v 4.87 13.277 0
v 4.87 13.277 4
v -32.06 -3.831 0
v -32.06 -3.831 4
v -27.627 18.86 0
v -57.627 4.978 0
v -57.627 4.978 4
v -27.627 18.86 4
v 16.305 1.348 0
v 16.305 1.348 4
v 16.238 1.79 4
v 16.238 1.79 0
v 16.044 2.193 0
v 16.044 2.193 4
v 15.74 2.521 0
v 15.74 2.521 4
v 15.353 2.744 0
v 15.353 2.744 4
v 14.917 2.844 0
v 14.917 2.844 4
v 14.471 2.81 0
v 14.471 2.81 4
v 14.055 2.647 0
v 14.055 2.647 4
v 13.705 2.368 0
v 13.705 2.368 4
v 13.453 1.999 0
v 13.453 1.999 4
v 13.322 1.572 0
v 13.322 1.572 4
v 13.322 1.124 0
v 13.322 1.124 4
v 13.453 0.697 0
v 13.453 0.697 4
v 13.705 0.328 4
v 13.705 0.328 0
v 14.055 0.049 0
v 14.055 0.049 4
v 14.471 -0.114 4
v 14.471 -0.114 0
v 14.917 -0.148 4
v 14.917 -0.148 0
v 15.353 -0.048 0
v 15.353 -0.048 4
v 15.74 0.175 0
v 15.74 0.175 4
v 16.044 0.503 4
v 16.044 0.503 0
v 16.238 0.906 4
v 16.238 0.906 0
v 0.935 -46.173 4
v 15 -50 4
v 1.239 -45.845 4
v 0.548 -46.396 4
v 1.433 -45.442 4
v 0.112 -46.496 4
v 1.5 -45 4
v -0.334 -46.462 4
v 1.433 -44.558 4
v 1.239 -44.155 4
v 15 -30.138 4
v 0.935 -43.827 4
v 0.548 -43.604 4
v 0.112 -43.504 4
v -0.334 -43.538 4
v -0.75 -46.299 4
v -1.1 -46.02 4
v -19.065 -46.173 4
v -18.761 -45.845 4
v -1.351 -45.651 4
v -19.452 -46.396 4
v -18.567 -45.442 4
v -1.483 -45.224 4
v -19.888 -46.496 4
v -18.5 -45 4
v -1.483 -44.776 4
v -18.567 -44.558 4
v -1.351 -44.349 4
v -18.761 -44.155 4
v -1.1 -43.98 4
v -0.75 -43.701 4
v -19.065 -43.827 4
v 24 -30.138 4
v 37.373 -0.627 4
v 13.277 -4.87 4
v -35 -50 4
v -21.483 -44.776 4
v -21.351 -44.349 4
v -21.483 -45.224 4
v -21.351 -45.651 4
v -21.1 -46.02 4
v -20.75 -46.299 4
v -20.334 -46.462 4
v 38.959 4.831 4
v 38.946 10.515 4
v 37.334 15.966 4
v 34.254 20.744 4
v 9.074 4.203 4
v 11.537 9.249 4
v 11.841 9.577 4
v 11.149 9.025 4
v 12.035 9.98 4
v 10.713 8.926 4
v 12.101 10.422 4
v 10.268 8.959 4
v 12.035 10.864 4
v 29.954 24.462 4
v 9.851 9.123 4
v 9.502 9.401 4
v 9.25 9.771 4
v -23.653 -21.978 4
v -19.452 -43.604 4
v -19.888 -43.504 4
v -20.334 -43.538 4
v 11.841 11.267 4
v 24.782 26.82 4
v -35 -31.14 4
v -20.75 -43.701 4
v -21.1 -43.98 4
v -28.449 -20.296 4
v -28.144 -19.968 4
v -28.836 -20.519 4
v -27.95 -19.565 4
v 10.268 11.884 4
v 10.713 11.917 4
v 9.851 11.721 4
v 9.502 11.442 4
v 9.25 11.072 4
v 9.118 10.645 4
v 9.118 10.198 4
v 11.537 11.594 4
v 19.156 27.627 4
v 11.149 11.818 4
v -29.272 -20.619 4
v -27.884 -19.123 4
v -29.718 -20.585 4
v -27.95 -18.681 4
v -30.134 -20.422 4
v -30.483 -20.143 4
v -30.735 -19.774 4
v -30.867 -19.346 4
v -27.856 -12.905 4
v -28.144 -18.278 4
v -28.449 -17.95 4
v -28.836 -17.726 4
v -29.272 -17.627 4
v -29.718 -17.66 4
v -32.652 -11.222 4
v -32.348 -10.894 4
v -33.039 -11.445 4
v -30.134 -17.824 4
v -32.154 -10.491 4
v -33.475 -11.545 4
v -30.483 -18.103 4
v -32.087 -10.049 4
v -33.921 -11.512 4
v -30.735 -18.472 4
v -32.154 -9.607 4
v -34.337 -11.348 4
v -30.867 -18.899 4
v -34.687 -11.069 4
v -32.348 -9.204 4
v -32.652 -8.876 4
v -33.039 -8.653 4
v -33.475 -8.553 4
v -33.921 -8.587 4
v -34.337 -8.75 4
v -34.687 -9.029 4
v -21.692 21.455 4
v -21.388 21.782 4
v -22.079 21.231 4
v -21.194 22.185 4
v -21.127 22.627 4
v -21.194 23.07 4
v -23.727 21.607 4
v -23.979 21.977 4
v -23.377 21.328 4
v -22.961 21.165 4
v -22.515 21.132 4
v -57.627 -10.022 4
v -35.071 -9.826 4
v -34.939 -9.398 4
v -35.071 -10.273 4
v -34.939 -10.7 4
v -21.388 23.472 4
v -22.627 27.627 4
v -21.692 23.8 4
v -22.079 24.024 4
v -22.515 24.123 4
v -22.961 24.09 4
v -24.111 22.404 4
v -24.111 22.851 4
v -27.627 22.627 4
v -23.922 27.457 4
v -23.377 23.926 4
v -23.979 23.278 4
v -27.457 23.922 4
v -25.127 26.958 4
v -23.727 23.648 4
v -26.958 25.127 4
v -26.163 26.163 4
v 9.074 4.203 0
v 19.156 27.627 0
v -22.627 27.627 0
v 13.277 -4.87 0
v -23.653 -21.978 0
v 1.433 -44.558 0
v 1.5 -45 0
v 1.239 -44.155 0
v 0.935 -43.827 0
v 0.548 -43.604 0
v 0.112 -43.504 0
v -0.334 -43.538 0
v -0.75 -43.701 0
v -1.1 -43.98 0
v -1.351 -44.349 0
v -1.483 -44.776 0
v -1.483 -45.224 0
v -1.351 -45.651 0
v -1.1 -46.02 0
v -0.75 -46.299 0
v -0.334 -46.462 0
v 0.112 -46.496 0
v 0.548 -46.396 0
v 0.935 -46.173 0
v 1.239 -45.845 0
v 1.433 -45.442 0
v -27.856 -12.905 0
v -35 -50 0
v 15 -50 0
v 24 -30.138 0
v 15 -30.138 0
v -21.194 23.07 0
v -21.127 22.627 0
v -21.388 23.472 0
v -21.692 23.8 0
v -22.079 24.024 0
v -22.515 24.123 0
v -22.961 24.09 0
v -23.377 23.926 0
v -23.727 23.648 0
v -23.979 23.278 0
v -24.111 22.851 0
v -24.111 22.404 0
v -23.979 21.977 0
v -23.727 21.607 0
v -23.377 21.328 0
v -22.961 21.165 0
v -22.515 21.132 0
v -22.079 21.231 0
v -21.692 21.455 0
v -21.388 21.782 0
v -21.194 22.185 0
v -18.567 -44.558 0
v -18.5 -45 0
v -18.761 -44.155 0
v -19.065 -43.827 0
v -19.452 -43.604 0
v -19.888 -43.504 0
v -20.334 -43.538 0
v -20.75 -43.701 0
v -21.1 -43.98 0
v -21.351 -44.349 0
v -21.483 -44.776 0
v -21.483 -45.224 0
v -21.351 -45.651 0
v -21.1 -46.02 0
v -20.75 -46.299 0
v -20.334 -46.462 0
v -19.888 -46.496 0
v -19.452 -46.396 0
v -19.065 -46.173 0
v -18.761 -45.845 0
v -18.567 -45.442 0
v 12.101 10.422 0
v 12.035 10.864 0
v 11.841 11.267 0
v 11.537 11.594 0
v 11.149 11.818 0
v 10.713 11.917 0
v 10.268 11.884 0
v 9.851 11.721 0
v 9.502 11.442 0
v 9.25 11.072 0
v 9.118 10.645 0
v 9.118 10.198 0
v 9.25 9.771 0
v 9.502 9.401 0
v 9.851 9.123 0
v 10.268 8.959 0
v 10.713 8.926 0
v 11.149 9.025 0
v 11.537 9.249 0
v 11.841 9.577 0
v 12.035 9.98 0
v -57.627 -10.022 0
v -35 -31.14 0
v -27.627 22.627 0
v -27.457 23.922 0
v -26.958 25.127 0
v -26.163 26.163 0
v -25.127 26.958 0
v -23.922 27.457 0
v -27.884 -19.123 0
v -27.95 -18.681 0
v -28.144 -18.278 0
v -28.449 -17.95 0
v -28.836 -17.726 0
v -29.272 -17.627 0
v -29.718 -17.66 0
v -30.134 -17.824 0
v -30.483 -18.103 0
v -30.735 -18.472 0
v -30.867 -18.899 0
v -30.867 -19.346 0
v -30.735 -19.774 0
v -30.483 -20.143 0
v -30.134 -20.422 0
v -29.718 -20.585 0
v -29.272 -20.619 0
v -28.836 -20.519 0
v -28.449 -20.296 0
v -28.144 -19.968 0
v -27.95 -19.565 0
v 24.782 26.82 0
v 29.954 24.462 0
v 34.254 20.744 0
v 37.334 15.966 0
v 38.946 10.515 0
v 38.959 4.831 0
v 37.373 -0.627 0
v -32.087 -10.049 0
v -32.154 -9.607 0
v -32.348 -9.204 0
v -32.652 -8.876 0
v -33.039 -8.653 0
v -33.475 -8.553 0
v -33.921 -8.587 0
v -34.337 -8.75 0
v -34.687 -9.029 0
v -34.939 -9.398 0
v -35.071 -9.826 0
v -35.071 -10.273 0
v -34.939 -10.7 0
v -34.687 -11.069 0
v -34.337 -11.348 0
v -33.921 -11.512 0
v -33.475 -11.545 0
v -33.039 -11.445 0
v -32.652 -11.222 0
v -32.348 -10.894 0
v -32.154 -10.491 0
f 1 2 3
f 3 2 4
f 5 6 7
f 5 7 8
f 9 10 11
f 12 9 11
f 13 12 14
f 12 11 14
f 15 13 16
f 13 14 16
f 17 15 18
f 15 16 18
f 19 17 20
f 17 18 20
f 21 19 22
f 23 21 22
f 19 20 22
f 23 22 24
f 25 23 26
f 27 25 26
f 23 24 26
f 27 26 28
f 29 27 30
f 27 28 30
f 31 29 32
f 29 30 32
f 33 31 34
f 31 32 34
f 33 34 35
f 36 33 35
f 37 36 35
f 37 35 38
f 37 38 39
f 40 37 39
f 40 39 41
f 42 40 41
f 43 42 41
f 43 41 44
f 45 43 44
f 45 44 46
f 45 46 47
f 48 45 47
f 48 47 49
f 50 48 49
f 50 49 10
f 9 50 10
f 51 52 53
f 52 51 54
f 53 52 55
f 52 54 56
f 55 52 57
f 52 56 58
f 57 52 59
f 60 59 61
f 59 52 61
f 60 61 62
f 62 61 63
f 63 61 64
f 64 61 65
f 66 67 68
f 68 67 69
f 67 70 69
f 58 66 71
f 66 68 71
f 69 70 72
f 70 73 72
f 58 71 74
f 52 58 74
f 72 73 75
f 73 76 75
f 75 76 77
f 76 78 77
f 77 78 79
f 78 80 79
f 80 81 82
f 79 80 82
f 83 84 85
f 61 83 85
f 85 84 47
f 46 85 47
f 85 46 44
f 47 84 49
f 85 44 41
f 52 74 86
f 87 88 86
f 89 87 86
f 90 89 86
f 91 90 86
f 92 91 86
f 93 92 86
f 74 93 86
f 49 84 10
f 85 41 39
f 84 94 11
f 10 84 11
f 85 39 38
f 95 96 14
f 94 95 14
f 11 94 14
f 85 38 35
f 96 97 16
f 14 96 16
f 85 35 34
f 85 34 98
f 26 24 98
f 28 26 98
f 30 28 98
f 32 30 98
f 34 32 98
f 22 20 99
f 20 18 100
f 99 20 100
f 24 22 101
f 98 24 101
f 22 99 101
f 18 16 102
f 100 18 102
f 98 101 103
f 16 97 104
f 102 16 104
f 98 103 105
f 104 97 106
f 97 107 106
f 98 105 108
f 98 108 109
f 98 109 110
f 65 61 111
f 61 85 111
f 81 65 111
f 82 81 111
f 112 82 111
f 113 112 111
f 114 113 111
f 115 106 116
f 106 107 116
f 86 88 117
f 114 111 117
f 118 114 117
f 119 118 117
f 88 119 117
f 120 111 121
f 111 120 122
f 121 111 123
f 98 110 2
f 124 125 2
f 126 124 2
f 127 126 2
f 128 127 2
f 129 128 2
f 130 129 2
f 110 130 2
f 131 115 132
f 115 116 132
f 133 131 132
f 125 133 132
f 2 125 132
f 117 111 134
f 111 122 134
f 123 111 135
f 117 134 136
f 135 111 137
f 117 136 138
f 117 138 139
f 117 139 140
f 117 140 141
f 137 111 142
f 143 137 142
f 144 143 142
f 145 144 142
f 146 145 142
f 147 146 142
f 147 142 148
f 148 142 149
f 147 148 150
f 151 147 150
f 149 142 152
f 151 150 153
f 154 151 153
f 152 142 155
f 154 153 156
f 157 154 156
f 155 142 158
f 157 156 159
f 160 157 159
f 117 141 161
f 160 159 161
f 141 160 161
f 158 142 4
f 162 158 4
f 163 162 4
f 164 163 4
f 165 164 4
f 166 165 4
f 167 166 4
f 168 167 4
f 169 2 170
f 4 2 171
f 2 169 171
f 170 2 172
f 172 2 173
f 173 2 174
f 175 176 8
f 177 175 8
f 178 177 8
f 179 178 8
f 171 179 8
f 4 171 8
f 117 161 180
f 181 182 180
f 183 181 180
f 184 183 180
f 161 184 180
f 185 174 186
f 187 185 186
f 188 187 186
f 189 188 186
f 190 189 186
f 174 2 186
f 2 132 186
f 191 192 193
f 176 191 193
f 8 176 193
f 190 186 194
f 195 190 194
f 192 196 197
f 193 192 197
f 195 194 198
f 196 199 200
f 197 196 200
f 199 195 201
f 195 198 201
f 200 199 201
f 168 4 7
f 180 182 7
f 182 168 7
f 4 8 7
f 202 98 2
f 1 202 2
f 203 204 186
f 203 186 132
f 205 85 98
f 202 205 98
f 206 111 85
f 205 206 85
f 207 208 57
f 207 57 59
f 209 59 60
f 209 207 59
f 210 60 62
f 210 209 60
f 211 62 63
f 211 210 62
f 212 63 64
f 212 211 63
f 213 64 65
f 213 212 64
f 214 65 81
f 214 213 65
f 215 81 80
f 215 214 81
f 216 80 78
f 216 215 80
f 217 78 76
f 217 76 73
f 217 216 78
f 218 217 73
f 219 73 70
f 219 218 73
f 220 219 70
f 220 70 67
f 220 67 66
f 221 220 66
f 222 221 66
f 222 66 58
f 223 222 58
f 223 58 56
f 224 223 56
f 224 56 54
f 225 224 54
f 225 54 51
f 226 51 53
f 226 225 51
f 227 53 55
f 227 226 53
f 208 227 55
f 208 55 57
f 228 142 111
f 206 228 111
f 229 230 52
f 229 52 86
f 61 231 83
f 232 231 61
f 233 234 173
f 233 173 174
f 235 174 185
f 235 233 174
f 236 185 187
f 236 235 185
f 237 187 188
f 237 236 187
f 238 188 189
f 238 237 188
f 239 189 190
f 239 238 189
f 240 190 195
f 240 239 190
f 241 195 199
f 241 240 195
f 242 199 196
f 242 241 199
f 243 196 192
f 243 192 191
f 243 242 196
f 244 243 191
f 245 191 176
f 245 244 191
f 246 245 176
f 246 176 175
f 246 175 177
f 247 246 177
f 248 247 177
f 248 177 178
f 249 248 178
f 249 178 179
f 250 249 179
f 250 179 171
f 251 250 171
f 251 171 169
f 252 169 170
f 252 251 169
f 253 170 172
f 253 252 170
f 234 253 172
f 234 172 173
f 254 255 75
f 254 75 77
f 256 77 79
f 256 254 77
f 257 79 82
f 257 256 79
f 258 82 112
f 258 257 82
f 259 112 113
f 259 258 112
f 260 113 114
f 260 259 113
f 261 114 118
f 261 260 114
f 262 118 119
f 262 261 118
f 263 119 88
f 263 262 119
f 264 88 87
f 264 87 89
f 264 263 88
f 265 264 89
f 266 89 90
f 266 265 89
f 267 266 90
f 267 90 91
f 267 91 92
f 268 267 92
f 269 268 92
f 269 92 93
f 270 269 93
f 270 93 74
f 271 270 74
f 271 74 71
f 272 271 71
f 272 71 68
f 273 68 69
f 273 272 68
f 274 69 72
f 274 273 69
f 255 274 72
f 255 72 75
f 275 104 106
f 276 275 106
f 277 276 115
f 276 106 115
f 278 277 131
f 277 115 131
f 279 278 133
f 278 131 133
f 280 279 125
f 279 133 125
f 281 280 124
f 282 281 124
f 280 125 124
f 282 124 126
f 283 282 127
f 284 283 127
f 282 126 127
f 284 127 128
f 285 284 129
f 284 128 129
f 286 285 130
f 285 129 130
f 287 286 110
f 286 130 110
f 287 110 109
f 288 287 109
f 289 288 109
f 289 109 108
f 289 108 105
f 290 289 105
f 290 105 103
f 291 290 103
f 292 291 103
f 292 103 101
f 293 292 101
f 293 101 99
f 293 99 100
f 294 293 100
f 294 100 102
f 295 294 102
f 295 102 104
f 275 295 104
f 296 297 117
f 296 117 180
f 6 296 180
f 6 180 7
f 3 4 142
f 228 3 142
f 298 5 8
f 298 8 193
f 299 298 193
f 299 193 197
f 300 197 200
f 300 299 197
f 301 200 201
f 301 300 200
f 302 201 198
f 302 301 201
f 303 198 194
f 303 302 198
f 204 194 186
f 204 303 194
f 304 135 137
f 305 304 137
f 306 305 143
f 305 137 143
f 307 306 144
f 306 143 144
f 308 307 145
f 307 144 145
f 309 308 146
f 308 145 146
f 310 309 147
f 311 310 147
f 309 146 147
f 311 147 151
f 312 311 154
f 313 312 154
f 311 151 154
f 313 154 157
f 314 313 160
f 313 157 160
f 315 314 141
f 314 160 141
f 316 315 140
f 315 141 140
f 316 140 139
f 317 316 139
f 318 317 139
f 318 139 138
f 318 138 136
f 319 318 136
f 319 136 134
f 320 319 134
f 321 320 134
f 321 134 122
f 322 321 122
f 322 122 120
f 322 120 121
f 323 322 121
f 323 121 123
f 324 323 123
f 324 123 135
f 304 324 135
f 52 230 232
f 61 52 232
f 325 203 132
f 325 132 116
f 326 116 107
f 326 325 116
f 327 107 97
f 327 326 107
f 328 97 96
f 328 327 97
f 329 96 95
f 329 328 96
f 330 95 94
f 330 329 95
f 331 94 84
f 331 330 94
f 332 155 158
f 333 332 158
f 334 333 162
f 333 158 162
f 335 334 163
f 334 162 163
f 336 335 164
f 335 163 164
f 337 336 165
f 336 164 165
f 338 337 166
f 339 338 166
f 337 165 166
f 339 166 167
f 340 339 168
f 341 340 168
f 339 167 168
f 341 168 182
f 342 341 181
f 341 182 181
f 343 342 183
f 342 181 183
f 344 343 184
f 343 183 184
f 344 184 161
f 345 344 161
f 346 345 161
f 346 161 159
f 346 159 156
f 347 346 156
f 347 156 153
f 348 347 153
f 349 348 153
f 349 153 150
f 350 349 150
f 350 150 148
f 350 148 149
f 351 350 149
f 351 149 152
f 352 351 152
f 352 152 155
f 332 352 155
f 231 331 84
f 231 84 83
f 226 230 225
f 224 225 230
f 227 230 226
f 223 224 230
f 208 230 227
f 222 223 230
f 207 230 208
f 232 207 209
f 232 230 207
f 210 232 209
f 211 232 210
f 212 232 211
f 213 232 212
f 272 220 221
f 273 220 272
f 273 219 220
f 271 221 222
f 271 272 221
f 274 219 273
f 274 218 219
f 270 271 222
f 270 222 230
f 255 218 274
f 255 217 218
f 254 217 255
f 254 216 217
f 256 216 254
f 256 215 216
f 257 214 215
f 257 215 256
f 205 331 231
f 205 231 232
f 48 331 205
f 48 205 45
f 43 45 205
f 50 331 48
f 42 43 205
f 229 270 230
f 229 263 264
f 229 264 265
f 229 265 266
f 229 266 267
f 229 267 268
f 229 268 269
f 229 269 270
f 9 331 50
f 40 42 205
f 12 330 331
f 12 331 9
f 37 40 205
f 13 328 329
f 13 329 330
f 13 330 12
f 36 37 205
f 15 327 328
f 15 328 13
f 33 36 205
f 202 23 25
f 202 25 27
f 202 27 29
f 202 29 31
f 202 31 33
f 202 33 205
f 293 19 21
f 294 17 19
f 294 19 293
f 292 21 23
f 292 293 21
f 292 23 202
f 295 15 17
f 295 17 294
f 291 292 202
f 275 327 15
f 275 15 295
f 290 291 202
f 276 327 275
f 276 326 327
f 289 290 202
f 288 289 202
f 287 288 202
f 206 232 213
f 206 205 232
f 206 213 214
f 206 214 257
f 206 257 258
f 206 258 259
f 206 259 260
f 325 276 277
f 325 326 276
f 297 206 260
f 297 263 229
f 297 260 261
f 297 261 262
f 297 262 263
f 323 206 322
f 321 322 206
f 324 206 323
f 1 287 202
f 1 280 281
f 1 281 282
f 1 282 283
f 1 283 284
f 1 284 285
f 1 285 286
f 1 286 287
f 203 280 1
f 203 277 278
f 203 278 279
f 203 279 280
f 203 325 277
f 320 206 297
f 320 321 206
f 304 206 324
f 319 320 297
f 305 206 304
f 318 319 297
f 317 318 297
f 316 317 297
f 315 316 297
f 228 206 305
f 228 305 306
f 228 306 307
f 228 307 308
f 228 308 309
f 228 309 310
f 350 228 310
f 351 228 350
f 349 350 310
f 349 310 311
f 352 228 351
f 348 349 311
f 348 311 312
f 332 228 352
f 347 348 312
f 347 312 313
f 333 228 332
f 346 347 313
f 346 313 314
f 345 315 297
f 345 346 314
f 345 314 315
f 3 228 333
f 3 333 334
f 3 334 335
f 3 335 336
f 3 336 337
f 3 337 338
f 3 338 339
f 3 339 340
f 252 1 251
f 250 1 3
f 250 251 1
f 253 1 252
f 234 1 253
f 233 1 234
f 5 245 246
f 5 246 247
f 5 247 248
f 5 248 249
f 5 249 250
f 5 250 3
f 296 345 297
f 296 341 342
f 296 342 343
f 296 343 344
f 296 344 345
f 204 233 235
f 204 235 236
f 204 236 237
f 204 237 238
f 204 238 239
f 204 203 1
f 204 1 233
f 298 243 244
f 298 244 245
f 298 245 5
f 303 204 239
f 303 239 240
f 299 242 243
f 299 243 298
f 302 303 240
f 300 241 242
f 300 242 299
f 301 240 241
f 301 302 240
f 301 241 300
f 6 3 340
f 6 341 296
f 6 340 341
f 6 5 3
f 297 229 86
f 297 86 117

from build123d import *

# Parameters (mm, degrees)
SCHIZZO1_R                   = 2.5
SCHIZZO1_R_2                 = 1.5
ESTRUSIONE_ESTRUSIONE1_DEPTH = 4
TAGLIO_ESTRUSIONE1_DEPTH     = 77.399732917
SCHIZZO3_R                   = 1.5
TAGLIO_ESTRUSIONE2_DEPTH     = 77.399732917
CROQUIS1_W                   = 9
CROQUIS1_H                   = 19.861523984
CORTAR_EXTRUIR1_DEPTH        = 10


with BuildPart() as part:
    # Schizzo1 → Estrusione-Estrusione1 (new body)
    with BuildSketch(Plane.XY):
        with BuildLine():
            Line((15, -50), (-35, -50))
            Line((-35, -50), (-35, -31.140095692))
            Line((-35, -31.140095692), (-57.627416998, -10.021990785))
            Line((-57.627416998, -10.021990785), (-57.627416998, 4.978009215))
            Line((-57.627416998, 4.978009215), (-27.627416998, 18.859904308))
            Line((-27.627416998, 18.859904308), (-27.627416998, 22.627416998))
            ThreePointArc((-27.627416998, 22.627416998), (-26.162950904, 26.162950904), (-22.627416998, 27.627416998))
            Line((-22.627416998, 27.627416998), (19.155603231, 27.627416998))
            ThreePointArc((19.155603231, 27.627416998), (35.964766047, 18.464946487), (37.372583002, -0.627378458))
            Line((37.372583002, -0.627378458), (15, -50))
        make_face()
        Circle(SCHIZZO1_R, mode=Mode.SUBTRACT)
        with Locations((-20, -45)):
            Circle(SCHIZZO1_R_2, mode=Mode.SUBTRACT)
        with Locations((0, -45)):
            Circle(SCHIZZO1_R_2, mode=Mode.SUBTRACT)
        with Locations((-22.627416998, 22.627416998)):
            Circle(SCHIZZO1_R_2, mode=Mode.SUBTRACT)
    extrude(amount=ESTRUSIONE_ESTRUSIONE1_DEPTH)

    # Schizzo2 → Taglio-Estrusione1 (cut, through all)
    with BuildSketch(Plane.XY.offset(4)):
        with BuildLine():
            Line((-27.856099407, -12.90456221), (-2.268412004, -1.050860115))
            ThreePointArc((-2.268412004, -1.050860115), (-1.050860115, 2.268412004), (2.268412004, 1.050860115))
            Line((2.268412004, 1.050860115), (9.073648015, 4.203440459))
            Line((9.073648015, 4.203440459), (4.870207556, 13.277088475))
            Line((4.870207556, 13.277088475), (-32.059539866, -3.830914194))
            Line((-32.059539866, -3.830914194), (-27.856099407, -12.90456221))
        make_face()
        with BuildLine():
            ThreePointArc((2.5, 0), (0.538038098, -2.441416598), (-2.268412004, -1.050860115))
            Line((-2.268412004, -1.050860115), (-27.856099407, -12.90456221))
            Line((-27.856099407, -12.90456221), (-23.652658948, -21.978210225))
            Line((-23.652658948, -21.978210225), (13.277088475, -4.870207556))
            Line((13.277088475, -4.870207556), (9.073648015, 4.203440459))
            Line((9.073648015, 4.203440459), (2.268412004, 1.050860115))
            ThreePointArc((2.268412004, 1.050860115), (2.441416598, 0.538038098), (2.5, 0))
        make_face()
    extrude(amount=-TAGLIO_ESTRUSIONE1_DEPTH, mode=Mode.SUBTRACT)

    # Schizzo3 → Taglio-Estrusione2 (cut, through all)
    with BuildSketch(Plane.XY.offset(4)):
        with Locations((10.601386992, 10.421640651)):
            Circle(SCHIZZO3_R)
        with Locations((14.804827451, 1.347992635)):
            Circle(SCHIZZO3_R)
        with Locations((-29.383838384, -19.122762401)):
            Circle(SCHIZZO3_R)
        with Locations((-33.587278843, -10.049114386)):
            Circle(SCHIZZO3_R)
    extrude(amount=-TAGLIO_ESTRUSIONE2_DEPTH, mode=Mode.SUBTRACT)

    # Croquis1 → Cortar-Extruir1 (cut)
    with BuildSketch(Plane(origin=(0, 0, 0), x_dir=(-1, 0, 0), z_dir=(0, 0, -1))):
        with Locations((-19.5, -40.069238008)):
            Rectangle(CROQUIS1_W, CROQUIS1_H)
    extrude(amount=-CORTAR_EXTRUIR1_DEPTH, mode=Mode.SUBTRACT)


solid = part.part
